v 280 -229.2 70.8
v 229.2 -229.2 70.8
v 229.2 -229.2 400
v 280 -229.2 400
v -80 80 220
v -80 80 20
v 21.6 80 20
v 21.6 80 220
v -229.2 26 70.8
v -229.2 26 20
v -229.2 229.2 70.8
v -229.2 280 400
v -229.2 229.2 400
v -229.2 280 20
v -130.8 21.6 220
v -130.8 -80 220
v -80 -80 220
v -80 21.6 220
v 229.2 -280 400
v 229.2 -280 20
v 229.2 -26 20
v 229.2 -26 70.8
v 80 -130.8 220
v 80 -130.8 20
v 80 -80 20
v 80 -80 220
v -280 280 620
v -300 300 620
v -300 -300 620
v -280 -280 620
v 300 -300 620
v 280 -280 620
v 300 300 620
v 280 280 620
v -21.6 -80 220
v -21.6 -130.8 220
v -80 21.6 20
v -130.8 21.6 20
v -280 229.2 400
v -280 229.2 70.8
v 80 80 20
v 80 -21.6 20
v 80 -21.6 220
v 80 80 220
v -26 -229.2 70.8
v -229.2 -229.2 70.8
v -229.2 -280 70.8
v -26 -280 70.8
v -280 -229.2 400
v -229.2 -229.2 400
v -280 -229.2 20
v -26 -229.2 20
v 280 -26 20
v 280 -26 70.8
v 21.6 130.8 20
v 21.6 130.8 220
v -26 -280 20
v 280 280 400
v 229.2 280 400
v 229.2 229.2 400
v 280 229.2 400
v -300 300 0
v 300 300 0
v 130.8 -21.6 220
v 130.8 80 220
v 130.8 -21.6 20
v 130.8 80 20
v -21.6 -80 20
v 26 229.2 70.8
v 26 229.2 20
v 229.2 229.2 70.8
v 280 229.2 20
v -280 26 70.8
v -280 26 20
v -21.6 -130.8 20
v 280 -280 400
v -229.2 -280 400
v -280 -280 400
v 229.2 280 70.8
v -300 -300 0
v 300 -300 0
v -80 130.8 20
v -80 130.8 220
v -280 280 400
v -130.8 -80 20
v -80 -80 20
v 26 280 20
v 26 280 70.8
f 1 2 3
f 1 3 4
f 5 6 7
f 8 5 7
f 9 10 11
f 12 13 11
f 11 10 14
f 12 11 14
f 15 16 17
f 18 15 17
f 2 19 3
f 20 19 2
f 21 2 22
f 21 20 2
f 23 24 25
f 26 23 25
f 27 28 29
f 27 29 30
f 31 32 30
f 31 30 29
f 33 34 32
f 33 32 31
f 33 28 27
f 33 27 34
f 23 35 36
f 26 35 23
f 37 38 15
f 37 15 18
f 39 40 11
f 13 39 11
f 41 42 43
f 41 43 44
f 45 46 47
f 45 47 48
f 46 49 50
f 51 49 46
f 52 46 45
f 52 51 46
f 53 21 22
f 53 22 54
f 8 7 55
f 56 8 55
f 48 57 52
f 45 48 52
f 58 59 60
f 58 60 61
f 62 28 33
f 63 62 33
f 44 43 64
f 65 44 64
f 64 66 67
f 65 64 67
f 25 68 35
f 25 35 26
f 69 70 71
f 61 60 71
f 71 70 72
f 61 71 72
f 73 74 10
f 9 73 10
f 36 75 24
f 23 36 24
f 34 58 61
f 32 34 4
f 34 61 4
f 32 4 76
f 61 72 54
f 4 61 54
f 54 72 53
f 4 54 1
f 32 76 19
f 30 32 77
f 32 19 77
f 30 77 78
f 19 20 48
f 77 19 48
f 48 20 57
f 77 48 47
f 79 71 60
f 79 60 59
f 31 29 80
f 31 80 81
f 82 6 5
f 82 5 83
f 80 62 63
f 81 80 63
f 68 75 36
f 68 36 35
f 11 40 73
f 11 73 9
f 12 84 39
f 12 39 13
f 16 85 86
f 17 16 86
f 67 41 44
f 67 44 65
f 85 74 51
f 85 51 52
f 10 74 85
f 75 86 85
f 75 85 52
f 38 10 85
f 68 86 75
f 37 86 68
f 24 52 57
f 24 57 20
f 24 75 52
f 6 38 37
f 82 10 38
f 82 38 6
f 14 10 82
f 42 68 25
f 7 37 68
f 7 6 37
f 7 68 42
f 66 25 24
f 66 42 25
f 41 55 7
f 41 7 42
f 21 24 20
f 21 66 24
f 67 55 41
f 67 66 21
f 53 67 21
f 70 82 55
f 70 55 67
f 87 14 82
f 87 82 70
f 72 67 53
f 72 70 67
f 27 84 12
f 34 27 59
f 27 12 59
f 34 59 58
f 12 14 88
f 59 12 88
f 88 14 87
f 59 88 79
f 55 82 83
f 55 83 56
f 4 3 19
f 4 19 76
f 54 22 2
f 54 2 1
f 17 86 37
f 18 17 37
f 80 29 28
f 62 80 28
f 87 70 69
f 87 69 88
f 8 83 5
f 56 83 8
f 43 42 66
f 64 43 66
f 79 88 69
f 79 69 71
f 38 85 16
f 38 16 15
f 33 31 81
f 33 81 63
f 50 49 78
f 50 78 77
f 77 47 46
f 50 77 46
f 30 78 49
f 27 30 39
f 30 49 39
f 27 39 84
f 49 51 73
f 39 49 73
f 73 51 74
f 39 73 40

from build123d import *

# Parameters (mm, degrees)
F1_DEPTH = 20
F0_W     = 600
F0_H     = 600
F2_DEPTH = 620
F0_W_2   = 50.8
F0_H_2   = 101.6
F0_W_3   = 101.6
F0_H_3   = 50.8
F3_DEPTH = 220
F0_H_4   = 203.2
F0_W_4   = 203.2
F4_DEPTH = 70.8
F5_DEPTH = 400


with BuildPart() as f1:
    # F0 (on Top) → F1 (new body)
    with BuildSketch(Plane.XY):
        Polygon((26, 280), (-229.2, 280), (-229.2, 229.2), (-229.2, 26), (-280, 26), (-280, -229.2), (-229.2, -229.2), (-26, -229.2), (-26, -280), (229.2, -280), (229.2, -229.2), (229.2, -26), (280, -26), (280, 229.2), (229.2, 229.2), (26, 229.2), align=None)
        Polygon((-130.8, 130.8), (-80, 130.8), (21.6, 130.8), (130.8, 130.8), (130.8, 80), (130.8, -21.6), (130.8, -130.8), (80, -130.8), (-21.6, -130.8), (-130.8, -130.8), (-130.8, -80), (-130.8, 21.6), align=None, mode=Mode.SUBTRACT)
        Polygon((21.6, 80), (-80, 80), (-80, 130.8), (-130.8, 130.8), (-130.8, 21.6), (-80, 21.6), (-80, -80), (-130.8, -80), (-130.8, -130.8), (-21.6, -130.8), (-21.6, -80), (80, -80), (80, -130.8), (130.8, -130.8), (130.8, -21.6), (80, -21.6), (80, 80), (130.8, 80), (130.8, 130.8), (21.6, 130.8), align=None)
    extrude(amount=F1_DEPTH)

    # F0 (on Top) → F2 (join)
    with BuildSketch(Plane.XY):
        Rectangle(F0_W, F0_H)
        Polygon((-280, 229.2), (-280, 280), (-229.2, 280), (26, 280), (229.2, 280), (280, 280), (280, 229.2), (280, -26), (280, -229.2), (280, -280), (229.2, -280), (-26, -280), (-229.2, -280), (-280, -280), (-280, -229.2), (-280, 26), align=None, mode=Mode.SUBTRACT)
    extrude(amount=F2_DEPTH)

    # F0 (on Top) → F3 (join)
    with BuildSketch(Plane.XY):
        with Locations((-105.4, -29.2)):
            Rectangle(F0_W_2, F0_H_2)
        with Locations((-29.2, 105.4)):
            Rectangle(F0_W_3, F0_H_3)
        with Locations((105.4, 29.2)):
            Rectangle(F0_W_2, F0_H_2)
        with Locations((29.2, -105.4)):
            Rectangle(F0_W_3, F0_H_3)
    extrude(amount=F3_DEPTH)

    # F0 (on Top) → F4 (join)
    with BuildSketch(Plane.XY):
        with Locations((-254.6, 127.6)):
            Rectangle(F0_W_2, F0_H_4)
        with Locations((254.6, -127.6)):
            Rectangle(F0_W_2, F0_H_4)
        with Locations((-127.6, -254.6)):
            Rectangle(F0_W_4, F0_H_3)
        with Locations((127.6, 254.6)):
            Rectangle(F0_W_4, F0_H_3)
    extrude(amount=F4_DEPTH)

    # F0 (on Top) → F5 (join)
    with BuildSketch(Plane.XY):
        with Locations((-254.6, 254.6)):
            Rectangle(F0_W_2, F0_H_3)
        with Locations((-254.6, -254.6)):
            Rectangle(F0_W_2, F0_H_3)
        with Locations((254.6, -254.6)):
            Rectangle(F0_W_2, F0_H_3)
        with Locations((254.6, 254.6)):
            Rectangle(F0_W_2, F0_H_3)
    extrude(amount=F5_DEPTH)


solid = f1.part
